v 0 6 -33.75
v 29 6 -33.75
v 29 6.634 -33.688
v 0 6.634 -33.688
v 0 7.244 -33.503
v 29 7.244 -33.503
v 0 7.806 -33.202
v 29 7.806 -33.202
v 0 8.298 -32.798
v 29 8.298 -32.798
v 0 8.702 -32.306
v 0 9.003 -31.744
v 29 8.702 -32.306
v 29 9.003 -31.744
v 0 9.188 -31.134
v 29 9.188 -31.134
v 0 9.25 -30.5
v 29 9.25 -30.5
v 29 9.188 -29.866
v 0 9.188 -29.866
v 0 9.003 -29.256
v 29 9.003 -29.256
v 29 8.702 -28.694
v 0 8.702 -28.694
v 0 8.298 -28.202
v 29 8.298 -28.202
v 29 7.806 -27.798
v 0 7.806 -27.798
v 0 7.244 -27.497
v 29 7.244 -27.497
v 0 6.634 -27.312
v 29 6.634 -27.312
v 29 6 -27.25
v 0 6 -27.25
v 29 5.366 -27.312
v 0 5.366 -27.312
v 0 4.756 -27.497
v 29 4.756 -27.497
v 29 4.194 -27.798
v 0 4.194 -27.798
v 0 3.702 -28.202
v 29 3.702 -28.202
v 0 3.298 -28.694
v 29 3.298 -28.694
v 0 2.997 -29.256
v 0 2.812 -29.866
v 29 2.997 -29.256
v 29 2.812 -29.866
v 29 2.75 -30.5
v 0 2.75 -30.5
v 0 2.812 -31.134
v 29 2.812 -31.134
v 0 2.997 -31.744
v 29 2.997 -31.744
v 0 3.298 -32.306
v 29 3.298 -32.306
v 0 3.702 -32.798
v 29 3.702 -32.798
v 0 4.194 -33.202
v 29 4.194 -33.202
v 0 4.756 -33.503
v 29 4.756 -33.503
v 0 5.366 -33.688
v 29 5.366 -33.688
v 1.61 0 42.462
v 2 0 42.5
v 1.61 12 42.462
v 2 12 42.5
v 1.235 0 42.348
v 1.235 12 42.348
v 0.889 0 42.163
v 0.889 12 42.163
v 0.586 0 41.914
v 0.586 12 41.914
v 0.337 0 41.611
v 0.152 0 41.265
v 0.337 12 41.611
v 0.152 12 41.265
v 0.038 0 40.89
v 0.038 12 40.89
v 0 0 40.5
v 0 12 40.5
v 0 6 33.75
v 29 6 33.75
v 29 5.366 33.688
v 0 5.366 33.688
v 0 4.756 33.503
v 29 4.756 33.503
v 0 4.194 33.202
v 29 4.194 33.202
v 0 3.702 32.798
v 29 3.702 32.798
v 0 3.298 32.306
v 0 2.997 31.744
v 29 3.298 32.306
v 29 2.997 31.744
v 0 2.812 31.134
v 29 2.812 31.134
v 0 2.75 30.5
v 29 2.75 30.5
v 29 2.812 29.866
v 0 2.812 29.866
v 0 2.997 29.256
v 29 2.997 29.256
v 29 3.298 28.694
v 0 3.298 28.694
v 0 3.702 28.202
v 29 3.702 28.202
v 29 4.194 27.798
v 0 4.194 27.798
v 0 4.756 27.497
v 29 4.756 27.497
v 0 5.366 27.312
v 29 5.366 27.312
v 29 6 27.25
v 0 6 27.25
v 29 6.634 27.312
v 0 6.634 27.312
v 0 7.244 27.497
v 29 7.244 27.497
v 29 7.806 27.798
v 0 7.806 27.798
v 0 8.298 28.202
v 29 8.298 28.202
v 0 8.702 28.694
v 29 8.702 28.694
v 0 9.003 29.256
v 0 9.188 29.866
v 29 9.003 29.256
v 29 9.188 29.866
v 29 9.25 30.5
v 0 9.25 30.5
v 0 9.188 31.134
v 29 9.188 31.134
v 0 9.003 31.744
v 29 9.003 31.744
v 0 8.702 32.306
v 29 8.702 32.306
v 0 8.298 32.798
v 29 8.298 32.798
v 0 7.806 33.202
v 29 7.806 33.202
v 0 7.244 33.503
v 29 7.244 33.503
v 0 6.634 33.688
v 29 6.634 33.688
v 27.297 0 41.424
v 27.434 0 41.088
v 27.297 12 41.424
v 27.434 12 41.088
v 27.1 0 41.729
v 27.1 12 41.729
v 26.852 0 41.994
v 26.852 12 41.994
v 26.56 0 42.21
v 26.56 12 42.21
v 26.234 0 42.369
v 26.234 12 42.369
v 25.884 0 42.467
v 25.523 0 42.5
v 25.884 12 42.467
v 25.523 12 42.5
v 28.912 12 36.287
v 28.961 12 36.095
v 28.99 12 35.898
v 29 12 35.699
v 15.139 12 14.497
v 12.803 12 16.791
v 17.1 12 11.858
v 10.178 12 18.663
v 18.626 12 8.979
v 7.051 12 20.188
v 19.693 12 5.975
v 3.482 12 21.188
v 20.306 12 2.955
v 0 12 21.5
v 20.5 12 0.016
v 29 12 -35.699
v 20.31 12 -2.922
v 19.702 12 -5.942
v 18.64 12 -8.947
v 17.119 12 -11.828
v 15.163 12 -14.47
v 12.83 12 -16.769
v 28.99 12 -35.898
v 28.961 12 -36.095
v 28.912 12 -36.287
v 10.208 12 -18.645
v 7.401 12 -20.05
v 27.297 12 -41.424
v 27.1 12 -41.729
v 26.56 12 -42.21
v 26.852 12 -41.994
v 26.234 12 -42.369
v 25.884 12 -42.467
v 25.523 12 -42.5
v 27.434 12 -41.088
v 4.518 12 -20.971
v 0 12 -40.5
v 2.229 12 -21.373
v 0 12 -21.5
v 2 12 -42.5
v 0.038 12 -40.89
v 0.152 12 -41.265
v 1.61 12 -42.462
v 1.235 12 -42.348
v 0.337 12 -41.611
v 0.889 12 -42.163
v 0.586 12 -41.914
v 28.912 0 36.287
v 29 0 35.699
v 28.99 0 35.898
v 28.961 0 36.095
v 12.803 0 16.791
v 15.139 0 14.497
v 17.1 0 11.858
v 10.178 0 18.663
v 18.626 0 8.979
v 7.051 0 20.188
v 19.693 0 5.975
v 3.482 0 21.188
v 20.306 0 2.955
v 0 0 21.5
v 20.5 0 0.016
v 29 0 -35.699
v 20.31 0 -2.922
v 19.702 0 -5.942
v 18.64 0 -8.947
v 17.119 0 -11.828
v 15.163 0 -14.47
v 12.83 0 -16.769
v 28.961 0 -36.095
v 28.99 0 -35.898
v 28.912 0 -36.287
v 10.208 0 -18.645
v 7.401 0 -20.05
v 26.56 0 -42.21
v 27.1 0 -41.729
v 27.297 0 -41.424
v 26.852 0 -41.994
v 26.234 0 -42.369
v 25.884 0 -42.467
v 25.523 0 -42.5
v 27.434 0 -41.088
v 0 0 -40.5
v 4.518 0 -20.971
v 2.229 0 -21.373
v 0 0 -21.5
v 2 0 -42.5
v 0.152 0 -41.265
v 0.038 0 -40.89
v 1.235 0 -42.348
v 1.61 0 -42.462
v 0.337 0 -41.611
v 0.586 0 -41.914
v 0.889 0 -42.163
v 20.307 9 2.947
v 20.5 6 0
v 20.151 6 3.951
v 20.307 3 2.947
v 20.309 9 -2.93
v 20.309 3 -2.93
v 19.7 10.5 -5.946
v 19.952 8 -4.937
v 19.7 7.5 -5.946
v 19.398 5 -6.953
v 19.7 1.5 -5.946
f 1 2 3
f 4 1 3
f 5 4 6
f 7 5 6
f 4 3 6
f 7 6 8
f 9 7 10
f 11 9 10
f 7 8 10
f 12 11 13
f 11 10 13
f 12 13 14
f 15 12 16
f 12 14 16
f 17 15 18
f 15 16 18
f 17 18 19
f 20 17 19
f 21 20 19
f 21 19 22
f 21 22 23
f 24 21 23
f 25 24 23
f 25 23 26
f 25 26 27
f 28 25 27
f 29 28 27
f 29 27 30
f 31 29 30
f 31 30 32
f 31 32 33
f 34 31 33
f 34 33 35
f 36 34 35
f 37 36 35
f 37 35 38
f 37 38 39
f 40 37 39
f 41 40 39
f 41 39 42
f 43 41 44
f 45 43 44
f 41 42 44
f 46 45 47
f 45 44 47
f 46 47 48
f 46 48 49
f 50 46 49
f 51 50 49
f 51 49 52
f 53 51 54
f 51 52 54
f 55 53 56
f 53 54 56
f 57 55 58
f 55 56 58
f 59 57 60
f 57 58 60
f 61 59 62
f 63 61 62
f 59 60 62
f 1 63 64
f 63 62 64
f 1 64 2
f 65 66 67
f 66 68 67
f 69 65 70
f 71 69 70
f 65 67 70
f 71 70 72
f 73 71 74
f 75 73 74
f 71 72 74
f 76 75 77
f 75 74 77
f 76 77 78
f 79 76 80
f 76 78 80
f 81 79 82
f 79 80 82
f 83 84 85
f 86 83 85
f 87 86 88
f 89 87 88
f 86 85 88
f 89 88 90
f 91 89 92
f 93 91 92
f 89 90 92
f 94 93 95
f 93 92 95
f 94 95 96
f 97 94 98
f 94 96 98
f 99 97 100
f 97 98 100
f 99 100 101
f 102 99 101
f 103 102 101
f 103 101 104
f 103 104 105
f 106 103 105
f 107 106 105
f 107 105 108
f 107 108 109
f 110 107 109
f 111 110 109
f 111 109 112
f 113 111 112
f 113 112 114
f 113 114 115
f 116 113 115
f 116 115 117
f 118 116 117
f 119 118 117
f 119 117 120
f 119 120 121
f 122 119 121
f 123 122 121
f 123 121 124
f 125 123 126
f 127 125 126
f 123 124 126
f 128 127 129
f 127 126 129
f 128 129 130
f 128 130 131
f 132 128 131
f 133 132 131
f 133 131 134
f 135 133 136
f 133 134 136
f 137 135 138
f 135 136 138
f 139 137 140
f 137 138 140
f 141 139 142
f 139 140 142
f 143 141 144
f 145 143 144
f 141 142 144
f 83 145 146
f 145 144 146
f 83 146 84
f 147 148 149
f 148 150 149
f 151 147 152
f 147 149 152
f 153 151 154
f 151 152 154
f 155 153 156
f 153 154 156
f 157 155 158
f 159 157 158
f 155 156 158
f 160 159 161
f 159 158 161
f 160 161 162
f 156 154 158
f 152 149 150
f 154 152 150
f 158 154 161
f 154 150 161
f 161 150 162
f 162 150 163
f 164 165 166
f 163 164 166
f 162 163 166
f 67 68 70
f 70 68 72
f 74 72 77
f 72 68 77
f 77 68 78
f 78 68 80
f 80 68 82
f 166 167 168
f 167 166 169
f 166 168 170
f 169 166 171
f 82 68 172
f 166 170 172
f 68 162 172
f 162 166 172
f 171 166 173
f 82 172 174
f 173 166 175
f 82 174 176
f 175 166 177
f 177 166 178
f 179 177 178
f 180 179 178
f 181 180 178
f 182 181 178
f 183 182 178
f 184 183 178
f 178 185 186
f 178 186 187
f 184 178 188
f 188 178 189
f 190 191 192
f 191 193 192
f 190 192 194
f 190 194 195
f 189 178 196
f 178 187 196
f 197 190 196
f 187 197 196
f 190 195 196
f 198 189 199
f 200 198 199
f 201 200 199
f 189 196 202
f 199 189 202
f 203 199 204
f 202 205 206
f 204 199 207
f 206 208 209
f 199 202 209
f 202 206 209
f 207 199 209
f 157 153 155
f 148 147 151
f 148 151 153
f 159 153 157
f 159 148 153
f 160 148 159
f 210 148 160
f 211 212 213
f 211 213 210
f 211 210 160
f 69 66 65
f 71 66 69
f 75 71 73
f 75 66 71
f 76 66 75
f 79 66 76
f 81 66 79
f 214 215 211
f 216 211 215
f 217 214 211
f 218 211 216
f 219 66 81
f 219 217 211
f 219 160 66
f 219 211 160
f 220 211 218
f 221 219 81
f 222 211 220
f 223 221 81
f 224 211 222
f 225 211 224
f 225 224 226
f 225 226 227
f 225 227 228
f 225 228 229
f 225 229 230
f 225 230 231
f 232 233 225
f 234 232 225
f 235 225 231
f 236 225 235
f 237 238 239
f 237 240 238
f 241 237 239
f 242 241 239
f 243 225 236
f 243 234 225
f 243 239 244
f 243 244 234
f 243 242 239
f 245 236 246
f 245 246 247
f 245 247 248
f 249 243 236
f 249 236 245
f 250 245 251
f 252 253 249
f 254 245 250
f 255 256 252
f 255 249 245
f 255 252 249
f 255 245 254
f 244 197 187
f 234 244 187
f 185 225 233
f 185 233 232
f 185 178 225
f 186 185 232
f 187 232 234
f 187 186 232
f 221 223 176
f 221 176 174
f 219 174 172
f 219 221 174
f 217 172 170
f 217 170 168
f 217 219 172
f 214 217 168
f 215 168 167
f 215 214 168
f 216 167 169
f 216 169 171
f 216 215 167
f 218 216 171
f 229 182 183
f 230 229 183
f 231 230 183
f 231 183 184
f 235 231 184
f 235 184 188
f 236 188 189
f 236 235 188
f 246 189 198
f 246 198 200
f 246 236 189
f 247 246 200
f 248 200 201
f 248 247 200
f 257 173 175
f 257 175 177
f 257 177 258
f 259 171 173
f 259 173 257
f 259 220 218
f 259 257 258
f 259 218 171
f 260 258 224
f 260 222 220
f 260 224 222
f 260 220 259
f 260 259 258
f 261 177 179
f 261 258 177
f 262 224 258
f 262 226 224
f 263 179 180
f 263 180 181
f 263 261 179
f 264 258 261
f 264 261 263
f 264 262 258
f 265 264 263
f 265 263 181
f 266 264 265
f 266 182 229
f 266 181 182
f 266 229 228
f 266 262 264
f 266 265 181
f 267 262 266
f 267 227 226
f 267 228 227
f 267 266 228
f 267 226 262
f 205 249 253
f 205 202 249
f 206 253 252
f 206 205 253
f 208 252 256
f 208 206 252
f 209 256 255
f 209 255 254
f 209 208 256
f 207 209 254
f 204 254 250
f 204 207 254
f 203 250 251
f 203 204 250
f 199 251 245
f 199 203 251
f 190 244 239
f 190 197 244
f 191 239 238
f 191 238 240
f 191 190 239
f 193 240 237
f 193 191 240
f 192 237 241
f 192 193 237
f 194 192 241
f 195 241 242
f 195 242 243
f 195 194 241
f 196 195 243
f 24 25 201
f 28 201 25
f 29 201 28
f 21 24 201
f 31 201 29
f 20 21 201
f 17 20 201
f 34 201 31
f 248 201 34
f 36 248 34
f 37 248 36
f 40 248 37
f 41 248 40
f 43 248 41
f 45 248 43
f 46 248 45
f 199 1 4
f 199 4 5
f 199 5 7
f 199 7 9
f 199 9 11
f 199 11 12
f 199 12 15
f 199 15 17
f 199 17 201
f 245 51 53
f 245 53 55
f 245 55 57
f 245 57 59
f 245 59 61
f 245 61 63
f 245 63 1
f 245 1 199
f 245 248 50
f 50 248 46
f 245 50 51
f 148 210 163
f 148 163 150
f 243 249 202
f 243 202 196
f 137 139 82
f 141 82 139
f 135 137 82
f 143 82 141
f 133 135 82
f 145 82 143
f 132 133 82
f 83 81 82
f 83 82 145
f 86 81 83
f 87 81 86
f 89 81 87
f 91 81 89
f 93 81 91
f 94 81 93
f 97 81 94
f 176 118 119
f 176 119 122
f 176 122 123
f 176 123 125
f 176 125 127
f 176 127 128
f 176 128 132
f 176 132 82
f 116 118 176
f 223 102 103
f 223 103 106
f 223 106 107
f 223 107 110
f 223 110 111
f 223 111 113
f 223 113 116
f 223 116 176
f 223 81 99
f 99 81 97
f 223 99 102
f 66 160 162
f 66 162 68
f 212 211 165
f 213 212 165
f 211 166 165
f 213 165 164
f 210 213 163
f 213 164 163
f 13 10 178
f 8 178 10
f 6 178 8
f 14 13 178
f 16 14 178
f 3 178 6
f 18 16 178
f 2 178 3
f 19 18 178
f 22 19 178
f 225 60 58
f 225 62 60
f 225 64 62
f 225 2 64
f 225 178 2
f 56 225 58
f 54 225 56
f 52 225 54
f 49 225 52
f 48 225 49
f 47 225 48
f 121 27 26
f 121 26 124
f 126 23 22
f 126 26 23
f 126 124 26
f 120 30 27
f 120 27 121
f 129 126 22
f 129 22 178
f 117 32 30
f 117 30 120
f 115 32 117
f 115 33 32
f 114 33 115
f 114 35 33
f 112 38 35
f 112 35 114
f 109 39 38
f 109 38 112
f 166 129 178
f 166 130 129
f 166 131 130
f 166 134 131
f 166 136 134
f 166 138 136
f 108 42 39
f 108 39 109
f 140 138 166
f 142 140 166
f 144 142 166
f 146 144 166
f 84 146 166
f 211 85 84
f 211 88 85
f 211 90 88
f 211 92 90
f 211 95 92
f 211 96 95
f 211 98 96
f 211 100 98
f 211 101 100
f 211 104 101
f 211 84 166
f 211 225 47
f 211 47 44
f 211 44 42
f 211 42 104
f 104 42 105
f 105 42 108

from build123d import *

# Parameters (mm, degrees)
EXTRUDE_1_DEPTH     = 12
FILLET_1_R          = 2
FILLET_2_R          = 2
SKETCH_2_R          = 3.25
CUT_EXTRUDE_1_DEPTH = 53.832281956


with BuildPart() as part:
    # 草圖1 → 填料-伸長1 (new body)
    with BuildSketch(Plane(origin=(0, 0, 0), x_dir=(1, 0, 0), z_dir=(0, 1, 0))):
        with BuildLine():
            Line((0, 21.5), (0, 42.5))
            Line((0, 42.5), (27, 42.5))
            Line((27, 42.5), (29, 36))
            Line((29, 36), (29, -36))
            Line((29, -36), (27, -42.5))
            Line((27, -42.5), (0, -42.5))
            Line((0, -42.5), (0, -21.5))
            add(Edge.make_bspline(
                [(0, -21.5), (20.5, -21.5), (20.5, 0), (20.5, 21.5), (0, 21.5)],
                knots=[3.141592654, 3.141592654, 3.141592654, 4.71238898, 4.71238898, 6.283185307, 6.283185307, 6.283185307], degree=2, weights=[1, 0.707106781, 1, 0.707106781, 1]))
        make_face()
    extrude(amount=EXTRUDE_1_DEPTH)

    # 圓角1
    fillet_1_edges = [part.edges().sort_by_distance(p)[0] for p in [
        (29, 6, 36),
        (27, 6, 42.5),
    ]]
    fillet(fillet_1_edges, radius=FILLET_1_R)

    # 圓角2
    fillet_2_edges = [part.edges().sort_by_distance(p)[0] for p in [
        (0, 6, -42.5),
        (27, 6, -42.5),
        (29, 6, -36),
        (0, 6, 42.5),
    ]]
    fillet(fillet_2_edges, radius=FILLET_2_R)

    # 草圖2 → 除料-伸長1 (cut, through all)
    with BuildSketch(Plane(origin=(29, 0, 0), x_dir=(0, 0, -1), z_dir=(1, 0, 0))):
        with Locations((30.5, 6)):
            Circle(SKETCH_2_R)
        with Locations(Location((-30.5, 6, 0), (0, 0, 180))):
            Circle(SKETCH_2_R)
    extrude(amount=-CUT_EXTRUDE_1_DEPTH, mode=Mode.SUBTRACT)


solid = part.part
